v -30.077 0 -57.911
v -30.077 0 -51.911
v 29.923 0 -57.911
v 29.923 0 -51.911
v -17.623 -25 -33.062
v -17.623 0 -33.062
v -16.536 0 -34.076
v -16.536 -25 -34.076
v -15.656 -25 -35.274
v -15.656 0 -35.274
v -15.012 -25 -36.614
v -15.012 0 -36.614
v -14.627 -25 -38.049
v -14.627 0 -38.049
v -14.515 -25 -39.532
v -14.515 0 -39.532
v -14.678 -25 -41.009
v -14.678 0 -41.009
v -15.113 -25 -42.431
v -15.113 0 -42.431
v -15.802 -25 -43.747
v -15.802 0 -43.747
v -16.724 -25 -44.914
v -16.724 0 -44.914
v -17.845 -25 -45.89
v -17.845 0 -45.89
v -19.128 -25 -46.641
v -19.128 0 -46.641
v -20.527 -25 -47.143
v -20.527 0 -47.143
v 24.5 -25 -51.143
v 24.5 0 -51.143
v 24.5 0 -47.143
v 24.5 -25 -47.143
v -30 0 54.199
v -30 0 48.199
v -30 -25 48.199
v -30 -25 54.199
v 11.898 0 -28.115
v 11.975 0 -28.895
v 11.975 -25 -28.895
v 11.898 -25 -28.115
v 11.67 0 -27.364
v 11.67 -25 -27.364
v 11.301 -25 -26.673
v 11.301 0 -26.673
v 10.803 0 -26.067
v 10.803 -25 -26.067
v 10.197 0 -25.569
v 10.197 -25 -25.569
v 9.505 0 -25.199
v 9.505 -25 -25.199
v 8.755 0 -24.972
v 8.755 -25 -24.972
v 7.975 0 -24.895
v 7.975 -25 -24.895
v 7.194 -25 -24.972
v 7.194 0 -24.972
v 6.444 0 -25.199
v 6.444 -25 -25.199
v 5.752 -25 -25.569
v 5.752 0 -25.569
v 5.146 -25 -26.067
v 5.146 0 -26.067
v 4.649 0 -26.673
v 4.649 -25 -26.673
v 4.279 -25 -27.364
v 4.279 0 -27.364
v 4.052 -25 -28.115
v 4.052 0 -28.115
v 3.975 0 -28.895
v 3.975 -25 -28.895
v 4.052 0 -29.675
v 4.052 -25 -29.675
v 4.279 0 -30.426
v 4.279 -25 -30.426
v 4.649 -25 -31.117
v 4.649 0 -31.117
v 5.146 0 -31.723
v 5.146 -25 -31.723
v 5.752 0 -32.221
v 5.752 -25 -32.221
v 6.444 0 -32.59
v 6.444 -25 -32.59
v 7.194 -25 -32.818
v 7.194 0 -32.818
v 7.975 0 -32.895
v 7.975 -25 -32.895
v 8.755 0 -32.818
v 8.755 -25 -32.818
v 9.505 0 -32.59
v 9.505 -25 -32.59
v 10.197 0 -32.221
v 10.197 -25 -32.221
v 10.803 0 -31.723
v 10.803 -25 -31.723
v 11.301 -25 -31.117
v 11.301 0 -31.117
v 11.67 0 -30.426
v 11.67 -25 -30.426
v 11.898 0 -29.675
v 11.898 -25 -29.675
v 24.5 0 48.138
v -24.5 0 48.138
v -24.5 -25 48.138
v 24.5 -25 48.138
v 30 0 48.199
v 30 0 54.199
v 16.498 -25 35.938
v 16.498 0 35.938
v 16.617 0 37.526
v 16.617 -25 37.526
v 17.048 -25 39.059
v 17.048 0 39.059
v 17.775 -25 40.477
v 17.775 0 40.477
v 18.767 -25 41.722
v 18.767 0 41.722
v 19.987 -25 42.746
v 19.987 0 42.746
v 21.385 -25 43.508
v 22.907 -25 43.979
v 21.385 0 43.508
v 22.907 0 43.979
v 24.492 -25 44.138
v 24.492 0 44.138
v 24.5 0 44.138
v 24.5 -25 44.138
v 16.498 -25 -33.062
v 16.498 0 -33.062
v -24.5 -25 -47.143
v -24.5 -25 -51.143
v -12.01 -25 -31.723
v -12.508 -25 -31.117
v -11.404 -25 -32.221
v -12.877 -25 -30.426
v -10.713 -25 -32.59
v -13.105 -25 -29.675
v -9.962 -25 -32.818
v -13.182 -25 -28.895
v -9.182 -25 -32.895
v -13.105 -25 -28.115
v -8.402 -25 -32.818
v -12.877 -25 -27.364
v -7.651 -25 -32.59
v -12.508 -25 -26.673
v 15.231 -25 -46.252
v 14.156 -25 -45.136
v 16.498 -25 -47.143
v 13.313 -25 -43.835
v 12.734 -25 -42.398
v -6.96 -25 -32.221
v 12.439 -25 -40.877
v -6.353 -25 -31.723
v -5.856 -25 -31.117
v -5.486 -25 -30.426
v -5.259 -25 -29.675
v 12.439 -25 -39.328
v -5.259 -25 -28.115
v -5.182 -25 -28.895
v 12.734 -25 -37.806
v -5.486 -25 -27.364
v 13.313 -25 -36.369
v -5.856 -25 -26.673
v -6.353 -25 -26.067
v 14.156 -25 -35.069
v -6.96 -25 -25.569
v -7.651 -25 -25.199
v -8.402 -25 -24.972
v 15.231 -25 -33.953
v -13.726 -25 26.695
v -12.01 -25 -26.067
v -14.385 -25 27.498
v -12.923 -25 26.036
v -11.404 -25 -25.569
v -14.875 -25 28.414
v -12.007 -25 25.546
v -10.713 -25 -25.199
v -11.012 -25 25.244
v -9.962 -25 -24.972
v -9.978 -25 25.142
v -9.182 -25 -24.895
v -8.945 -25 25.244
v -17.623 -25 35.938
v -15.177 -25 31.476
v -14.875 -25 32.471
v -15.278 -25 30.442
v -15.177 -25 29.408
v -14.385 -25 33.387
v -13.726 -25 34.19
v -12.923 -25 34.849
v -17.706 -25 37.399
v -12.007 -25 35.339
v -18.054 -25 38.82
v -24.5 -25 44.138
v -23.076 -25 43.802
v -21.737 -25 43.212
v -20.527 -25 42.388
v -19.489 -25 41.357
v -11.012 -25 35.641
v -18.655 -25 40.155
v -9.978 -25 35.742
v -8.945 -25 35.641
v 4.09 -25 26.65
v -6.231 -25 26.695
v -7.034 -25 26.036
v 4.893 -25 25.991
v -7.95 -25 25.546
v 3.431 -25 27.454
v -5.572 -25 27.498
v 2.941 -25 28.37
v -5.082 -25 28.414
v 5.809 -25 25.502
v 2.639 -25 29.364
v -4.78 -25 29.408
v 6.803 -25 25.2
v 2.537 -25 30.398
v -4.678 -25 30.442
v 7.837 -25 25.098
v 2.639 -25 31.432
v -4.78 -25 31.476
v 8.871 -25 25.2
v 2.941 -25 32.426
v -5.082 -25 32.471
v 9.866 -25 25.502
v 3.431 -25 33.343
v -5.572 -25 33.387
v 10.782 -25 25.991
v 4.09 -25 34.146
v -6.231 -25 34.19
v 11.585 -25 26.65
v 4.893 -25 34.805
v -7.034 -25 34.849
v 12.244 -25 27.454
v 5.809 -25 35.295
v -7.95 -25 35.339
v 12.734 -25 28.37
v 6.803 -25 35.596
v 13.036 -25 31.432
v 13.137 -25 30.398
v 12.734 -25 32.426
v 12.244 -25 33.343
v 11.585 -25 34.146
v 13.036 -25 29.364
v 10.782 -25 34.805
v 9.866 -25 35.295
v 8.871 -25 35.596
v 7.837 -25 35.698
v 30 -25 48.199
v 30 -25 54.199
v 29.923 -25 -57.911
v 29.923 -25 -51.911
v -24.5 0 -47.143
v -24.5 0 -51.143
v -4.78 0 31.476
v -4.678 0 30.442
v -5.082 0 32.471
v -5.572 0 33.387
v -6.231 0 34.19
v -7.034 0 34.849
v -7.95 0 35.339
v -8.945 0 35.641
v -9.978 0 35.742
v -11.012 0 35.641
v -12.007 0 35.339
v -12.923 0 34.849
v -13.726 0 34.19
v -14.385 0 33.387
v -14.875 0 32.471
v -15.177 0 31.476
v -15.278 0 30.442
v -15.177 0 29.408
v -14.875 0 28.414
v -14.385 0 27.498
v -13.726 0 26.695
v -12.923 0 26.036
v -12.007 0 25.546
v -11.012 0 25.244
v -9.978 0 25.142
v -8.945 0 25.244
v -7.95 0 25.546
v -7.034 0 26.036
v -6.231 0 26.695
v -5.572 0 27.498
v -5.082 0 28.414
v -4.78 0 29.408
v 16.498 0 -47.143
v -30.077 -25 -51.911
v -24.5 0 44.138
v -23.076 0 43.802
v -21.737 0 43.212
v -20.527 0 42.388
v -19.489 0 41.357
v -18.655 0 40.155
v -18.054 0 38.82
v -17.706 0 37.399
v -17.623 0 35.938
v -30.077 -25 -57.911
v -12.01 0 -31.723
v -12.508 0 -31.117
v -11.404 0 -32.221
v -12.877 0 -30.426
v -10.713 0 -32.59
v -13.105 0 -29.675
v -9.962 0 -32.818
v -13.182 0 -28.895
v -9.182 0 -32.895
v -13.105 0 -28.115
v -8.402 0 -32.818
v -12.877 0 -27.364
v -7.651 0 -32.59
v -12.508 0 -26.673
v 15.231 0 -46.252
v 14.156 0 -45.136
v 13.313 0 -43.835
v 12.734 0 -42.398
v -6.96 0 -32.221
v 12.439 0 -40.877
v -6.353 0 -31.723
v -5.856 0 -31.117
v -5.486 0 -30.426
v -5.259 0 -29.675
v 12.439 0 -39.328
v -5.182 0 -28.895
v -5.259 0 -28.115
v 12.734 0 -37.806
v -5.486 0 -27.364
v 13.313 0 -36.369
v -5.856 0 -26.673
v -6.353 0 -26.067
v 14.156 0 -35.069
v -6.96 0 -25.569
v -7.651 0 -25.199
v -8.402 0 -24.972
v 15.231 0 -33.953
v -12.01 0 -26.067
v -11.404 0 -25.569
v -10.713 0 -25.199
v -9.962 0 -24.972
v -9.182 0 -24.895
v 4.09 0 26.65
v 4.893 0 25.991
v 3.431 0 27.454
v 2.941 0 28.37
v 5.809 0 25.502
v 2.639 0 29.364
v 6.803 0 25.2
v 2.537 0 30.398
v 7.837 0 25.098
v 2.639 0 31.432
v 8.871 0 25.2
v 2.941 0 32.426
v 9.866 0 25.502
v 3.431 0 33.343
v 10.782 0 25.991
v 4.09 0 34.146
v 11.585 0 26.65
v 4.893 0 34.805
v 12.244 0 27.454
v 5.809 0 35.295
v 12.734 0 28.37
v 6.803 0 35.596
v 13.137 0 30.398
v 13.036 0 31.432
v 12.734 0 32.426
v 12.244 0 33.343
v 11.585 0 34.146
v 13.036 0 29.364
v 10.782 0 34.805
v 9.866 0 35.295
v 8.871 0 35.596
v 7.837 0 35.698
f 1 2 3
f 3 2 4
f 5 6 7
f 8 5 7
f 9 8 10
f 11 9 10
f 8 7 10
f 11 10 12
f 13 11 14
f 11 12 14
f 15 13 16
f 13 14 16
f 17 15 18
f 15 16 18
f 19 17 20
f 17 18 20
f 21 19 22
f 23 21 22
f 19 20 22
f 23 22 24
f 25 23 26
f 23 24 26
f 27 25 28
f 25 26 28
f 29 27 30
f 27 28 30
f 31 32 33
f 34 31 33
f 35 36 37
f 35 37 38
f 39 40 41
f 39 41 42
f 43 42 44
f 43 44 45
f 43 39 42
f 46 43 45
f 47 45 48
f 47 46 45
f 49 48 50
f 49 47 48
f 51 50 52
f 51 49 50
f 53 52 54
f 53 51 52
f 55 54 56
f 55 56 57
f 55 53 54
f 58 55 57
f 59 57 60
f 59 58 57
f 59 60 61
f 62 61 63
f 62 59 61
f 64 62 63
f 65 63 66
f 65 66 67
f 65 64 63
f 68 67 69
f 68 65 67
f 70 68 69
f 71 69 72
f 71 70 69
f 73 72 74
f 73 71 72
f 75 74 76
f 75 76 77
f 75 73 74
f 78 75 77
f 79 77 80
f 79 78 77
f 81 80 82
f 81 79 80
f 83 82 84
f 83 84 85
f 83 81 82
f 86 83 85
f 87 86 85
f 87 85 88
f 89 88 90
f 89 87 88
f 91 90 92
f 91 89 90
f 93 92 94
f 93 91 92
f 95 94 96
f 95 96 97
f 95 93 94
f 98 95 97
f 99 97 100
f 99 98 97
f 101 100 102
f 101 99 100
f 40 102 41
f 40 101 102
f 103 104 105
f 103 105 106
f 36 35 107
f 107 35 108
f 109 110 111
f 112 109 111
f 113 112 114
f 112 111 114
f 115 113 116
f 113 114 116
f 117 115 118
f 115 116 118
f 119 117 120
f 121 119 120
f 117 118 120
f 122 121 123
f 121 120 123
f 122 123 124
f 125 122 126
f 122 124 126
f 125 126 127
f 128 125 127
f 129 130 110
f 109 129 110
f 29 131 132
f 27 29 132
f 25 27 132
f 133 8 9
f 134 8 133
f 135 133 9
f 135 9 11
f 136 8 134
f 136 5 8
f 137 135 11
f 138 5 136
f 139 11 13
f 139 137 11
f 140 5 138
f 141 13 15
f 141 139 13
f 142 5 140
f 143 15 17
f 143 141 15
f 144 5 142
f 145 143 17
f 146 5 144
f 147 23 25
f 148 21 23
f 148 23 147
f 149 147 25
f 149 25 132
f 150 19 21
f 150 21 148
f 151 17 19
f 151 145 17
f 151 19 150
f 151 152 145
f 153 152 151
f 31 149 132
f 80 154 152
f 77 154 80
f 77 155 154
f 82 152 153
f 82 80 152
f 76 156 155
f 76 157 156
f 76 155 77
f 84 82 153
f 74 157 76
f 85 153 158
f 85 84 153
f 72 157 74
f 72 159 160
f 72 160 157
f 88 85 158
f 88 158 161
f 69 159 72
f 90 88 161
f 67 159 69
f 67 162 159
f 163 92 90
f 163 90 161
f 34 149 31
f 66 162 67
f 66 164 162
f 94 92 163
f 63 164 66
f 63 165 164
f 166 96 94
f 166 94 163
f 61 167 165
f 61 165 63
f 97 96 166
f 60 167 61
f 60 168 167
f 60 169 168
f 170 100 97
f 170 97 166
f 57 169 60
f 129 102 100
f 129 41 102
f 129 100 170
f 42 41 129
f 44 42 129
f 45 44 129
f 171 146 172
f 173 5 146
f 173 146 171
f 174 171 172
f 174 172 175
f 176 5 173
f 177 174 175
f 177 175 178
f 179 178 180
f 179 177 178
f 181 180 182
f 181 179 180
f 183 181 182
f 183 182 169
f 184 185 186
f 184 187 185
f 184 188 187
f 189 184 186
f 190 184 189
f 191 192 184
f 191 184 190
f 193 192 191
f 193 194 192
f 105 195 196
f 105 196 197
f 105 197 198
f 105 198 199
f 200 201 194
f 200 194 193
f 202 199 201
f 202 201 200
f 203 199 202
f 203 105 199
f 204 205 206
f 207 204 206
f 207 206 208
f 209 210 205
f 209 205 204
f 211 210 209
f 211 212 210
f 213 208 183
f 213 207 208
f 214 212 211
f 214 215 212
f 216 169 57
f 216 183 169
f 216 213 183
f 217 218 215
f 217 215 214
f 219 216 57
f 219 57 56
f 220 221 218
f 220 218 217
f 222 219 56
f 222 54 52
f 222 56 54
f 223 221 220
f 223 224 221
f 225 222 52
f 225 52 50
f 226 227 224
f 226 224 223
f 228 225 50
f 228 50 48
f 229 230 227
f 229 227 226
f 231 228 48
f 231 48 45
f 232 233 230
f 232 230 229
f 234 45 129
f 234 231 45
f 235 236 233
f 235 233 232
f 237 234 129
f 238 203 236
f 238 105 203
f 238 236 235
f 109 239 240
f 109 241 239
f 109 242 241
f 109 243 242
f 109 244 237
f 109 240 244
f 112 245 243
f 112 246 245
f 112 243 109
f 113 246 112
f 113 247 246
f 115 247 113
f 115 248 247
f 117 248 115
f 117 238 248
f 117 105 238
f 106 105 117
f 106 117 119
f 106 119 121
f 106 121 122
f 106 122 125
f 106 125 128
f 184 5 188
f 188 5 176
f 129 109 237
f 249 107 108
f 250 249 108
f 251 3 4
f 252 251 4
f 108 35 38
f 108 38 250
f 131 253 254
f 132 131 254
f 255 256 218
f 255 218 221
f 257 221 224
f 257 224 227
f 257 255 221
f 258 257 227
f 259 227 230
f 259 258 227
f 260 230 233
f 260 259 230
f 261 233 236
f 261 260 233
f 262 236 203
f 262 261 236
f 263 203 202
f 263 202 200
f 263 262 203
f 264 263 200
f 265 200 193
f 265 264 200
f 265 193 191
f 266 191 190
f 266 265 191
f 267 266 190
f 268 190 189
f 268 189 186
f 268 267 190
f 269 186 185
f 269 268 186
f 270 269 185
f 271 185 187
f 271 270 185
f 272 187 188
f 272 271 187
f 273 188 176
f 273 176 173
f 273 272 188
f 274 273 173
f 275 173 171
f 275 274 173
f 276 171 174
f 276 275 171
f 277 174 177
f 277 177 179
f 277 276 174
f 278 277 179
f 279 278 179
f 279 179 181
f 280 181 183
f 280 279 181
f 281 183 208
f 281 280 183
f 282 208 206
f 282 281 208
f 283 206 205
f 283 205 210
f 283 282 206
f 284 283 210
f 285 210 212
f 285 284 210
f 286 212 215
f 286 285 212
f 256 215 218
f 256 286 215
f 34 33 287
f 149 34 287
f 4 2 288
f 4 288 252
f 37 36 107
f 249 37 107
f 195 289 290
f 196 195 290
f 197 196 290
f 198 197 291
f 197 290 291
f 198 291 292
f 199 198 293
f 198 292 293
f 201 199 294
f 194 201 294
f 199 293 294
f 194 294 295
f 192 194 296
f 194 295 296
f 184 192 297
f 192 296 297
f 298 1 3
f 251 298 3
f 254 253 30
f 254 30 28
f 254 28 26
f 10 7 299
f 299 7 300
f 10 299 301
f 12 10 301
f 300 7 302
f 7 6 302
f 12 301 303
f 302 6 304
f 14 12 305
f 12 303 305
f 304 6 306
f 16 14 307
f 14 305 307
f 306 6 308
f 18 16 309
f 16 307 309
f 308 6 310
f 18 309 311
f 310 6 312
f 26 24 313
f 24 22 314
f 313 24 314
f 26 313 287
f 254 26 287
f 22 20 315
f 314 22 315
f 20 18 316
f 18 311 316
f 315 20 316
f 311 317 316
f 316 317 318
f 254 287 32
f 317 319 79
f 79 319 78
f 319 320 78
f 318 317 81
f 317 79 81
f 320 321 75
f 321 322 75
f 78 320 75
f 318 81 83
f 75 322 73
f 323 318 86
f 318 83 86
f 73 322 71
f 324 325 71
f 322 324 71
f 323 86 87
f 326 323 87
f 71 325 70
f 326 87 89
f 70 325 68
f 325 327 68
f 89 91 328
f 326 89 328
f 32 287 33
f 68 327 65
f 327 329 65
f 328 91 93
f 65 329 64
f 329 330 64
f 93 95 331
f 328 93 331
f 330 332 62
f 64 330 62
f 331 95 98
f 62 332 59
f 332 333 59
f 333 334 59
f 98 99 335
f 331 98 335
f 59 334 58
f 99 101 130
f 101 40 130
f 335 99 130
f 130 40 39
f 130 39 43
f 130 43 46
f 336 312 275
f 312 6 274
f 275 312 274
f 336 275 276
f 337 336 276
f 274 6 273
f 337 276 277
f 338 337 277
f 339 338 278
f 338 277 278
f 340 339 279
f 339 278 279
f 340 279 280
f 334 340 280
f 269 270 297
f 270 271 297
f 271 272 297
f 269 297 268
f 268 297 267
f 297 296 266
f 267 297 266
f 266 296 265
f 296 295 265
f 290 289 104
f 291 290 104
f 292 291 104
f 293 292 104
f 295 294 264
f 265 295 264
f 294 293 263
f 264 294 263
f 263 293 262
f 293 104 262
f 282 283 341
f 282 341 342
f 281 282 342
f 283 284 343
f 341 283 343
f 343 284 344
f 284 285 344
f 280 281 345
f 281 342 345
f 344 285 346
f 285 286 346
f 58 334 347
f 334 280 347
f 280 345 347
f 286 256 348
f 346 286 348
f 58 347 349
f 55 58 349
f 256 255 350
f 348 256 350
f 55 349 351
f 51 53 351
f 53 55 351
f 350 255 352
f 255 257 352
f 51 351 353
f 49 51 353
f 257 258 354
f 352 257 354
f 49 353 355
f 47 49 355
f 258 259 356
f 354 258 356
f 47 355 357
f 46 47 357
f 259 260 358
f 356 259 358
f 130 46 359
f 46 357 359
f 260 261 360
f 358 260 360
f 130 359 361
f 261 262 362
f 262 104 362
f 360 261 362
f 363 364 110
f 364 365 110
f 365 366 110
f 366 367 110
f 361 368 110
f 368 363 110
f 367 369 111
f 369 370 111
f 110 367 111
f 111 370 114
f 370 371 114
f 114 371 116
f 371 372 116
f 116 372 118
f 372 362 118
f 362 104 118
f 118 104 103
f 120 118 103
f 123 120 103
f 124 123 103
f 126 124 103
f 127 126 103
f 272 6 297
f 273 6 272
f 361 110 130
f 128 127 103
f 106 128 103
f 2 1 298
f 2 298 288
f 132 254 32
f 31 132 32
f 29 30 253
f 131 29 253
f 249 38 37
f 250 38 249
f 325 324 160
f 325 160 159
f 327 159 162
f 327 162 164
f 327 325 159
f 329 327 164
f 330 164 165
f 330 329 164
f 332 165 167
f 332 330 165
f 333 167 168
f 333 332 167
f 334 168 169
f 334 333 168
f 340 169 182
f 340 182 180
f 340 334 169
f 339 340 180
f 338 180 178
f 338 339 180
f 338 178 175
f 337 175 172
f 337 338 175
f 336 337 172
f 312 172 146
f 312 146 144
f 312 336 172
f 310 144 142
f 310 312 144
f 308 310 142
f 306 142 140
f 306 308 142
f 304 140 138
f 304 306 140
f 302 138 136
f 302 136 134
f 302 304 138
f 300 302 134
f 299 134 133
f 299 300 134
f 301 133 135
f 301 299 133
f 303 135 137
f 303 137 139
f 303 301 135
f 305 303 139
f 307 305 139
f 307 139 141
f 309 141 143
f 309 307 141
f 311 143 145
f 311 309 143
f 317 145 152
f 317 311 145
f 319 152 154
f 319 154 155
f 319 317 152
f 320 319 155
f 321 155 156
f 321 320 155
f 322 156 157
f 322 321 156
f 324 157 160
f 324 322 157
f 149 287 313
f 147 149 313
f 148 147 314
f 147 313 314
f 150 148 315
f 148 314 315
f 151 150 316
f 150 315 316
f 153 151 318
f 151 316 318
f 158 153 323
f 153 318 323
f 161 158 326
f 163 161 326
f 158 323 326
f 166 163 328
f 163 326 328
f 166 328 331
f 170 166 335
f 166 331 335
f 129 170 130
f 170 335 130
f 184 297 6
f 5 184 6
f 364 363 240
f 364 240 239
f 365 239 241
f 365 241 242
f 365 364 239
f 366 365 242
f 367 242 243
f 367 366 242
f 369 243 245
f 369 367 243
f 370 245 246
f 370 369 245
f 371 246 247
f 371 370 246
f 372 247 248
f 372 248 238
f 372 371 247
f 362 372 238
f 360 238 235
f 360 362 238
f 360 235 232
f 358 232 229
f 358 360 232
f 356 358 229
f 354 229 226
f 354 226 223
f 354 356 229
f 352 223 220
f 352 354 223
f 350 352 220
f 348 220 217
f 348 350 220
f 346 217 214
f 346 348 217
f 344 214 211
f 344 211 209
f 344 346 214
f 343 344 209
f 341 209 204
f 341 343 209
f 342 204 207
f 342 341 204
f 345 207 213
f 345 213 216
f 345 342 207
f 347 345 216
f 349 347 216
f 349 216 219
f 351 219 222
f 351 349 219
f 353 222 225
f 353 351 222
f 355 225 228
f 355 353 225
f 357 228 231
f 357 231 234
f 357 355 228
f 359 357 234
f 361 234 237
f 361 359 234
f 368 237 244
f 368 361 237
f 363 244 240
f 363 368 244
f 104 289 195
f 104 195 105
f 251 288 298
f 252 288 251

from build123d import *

# Parameters (mm, degrees)
F0_W     = 60
F0_H     = 6
F1_DEPTH = 25
F0_W_2   = 49
F0_H_2   = 4
F0_R     = 4
F0_R_2   = 5.3


with BuildPart() as f1:
    # F0 (on Front) → F1 (new body)
    with BuildSketch(Plane.XZ):
        with Locations((-0.0771296024, -54.9107142985)):
            Rectangle(F0_W, F0_H)
    extrude(amount=F1_DEPTH)


with BuildPart() as f1b:
    # F0 (on Front) → F1, piece 2 (new body)
    with BuildSketch(Plane.XZ):
        with Locations((0, 51.1985905468)):
            Rectangle(F0_W, F0_H)
    extrude(amount=F1_DEPTH)


with BuildPart() as f1c:
    # F0 (on Front) → F1, piece 3 (new body)
    with BuildSketch(Plane.XZ):
        with Locations((0, 46.1378805339)):
            Rectangle(F0_W_2, F0_H_2)
        with BuildLine():
            ThreePointArc((24.5, -47.1425395012), (20.4991438354, -48.1999383489), (16.4982876707, -47.1425395012))
            Line((16.4982876707, -47.1425395012), (-20.5270550462, -47.1425395012))
            ThreePointArc((-20.5270550462, -47.1425395012), (-22.5135275231, -47.3930926113), (-24.5, -47.1425395012))
            Line((-24.5, -47.1425395012), (-24.5, -51.1425395012))
            Line((-24.5, -51.1425395012), (24.5, -51.1425395012))
            Line((24.5, -51.1425395012), (24.5, -47.1425395012))
        make_face()
        with BuildLine():
            ThreePointArc((16.4982876707, 35.9380108601), (18.7701769789, 41.7251304893), (24.5, 44.1378805339))
            Line((24.5, 44.1378805339), (-24.5, 44.1378805339))
            ThreePointArc((-24.5, 44.1378805339), (-19.4885163945, 41.3571658308), (-17.6230133544, 35.9380108601))
            Line((-17.6230133544, 35.9380108601), (16.4982876707, 35.9380108601))
        make_face()
        with BuildLine():
            ThreePointArc((-24.5, -47.1425395012), (-22.5135275231, -47.3930926113), (-20.5270550462, -47.1425395012))
            Line((-20.5270550462, -47.1425395012), (-24.5, -47.1425395012))
        make_face()
        with BuildLine():
            Line((24.5, -47.1425395012), (16.4982876707, -47.1425395012))
            ThreePointArc((16.4982876707, -47.1425395012), (20.4991438354, -48.1999383489), (24.5, -47.1425395012))
        make_face()
        with BuildLine():
            Line((16.4982876707, -33.0619891399), (16.4982876707, 35.9380108601))
            Line((16.4982876707, 35.9380108601), (-17.6230133544, 35.9380108601))
            Line((-17.6230133544, 35.9380108601), (-17.6230133544, -33.0619891399))
            ThreePointArc((-17.6230133544, -33.0619891399), (-14.678432696, -41.0090409552), (-20.5270550462, -47.1425395012))
            Line((-20.5270550462, -47.1425395012), (16.4982876707, -47.1425395012))
            ThreePointArc((16.4982876707, -47.1425395012), (12.401469807, -40.1022643205), (16.4982876707, -33.0619891399))
        make_face()
        with Locations((-9.1818850487, -28.8949348032)):
            Circle(F0_R, mode=Mode.SUBTRACT)
        with Locations((7.9746739939, -28.8949348032)):
            Circle(F0_R, mode=Mode.SUBTRACT)
        with Locations((-9.9784871563, 30.4424017668)):
            Circle(F0_R_2, mode=Mode.SUBTRACT)
        with Locations((7.8374212608, 30.3981341422)):
            Circle(F0_R_2, mode=Mode.SUBTRACT)
    extrude(amount=F1_DEPTH)


solid = Compound([f1.part, f1b.part, f1c.part])
